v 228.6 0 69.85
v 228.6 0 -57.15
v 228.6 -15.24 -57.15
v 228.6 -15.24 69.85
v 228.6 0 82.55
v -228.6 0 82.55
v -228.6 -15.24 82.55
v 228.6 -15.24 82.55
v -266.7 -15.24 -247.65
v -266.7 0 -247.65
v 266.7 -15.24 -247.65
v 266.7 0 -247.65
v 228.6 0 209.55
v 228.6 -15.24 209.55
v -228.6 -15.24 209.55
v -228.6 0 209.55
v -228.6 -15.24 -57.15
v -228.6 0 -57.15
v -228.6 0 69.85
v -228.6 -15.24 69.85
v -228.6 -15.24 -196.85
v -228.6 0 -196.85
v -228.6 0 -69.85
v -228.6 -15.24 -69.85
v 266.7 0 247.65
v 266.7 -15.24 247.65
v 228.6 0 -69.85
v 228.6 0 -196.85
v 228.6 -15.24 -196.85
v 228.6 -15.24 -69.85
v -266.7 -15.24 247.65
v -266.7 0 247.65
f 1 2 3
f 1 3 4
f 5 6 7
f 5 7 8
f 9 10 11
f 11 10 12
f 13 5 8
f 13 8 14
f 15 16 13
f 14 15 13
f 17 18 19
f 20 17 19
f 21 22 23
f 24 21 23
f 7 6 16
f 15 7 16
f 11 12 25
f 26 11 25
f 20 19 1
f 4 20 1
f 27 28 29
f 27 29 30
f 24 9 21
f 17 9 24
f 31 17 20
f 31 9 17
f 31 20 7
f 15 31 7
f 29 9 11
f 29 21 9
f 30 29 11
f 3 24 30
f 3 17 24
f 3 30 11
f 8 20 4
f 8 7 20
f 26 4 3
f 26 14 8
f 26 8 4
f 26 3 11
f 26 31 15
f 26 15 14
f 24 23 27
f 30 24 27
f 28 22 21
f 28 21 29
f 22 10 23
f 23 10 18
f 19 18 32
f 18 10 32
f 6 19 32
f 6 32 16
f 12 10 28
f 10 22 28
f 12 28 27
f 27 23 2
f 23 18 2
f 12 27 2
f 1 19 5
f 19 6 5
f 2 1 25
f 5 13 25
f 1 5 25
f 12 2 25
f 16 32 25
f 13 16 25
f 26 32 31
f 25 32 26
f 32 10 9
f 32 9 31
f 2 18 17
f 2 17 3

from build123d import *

# Parameters (mm, degrees)
F0_W     = 533.4
F0_H     = 495.3
F0_W_2   = 457.2
F0_H_2   = 127
F1_DEPTH = 15.24


with BuildPart() as f1:
    # F0 (on Front) → F1 (new body)
    with BuildSketch(Plane.XZ):
        Rectangle(F0_W, F0_H)
        with Locations((0, -133.35)):
            Rectangle(F0_W_2, F0_H_2, mode=Mode.SUBTRACT)
        with Locations((0, 6.35)):
            Rectangle(F0_W_2, F0_H_2, mode=Mode.SUBTRACT)
        with Locations((0, 146.05)):
            Rectangle(F0_W_2, F0_H_2, mode=Mode.SUBTRACT)
    extrude(amount=F1_DEPTH)


solid = f1.part
